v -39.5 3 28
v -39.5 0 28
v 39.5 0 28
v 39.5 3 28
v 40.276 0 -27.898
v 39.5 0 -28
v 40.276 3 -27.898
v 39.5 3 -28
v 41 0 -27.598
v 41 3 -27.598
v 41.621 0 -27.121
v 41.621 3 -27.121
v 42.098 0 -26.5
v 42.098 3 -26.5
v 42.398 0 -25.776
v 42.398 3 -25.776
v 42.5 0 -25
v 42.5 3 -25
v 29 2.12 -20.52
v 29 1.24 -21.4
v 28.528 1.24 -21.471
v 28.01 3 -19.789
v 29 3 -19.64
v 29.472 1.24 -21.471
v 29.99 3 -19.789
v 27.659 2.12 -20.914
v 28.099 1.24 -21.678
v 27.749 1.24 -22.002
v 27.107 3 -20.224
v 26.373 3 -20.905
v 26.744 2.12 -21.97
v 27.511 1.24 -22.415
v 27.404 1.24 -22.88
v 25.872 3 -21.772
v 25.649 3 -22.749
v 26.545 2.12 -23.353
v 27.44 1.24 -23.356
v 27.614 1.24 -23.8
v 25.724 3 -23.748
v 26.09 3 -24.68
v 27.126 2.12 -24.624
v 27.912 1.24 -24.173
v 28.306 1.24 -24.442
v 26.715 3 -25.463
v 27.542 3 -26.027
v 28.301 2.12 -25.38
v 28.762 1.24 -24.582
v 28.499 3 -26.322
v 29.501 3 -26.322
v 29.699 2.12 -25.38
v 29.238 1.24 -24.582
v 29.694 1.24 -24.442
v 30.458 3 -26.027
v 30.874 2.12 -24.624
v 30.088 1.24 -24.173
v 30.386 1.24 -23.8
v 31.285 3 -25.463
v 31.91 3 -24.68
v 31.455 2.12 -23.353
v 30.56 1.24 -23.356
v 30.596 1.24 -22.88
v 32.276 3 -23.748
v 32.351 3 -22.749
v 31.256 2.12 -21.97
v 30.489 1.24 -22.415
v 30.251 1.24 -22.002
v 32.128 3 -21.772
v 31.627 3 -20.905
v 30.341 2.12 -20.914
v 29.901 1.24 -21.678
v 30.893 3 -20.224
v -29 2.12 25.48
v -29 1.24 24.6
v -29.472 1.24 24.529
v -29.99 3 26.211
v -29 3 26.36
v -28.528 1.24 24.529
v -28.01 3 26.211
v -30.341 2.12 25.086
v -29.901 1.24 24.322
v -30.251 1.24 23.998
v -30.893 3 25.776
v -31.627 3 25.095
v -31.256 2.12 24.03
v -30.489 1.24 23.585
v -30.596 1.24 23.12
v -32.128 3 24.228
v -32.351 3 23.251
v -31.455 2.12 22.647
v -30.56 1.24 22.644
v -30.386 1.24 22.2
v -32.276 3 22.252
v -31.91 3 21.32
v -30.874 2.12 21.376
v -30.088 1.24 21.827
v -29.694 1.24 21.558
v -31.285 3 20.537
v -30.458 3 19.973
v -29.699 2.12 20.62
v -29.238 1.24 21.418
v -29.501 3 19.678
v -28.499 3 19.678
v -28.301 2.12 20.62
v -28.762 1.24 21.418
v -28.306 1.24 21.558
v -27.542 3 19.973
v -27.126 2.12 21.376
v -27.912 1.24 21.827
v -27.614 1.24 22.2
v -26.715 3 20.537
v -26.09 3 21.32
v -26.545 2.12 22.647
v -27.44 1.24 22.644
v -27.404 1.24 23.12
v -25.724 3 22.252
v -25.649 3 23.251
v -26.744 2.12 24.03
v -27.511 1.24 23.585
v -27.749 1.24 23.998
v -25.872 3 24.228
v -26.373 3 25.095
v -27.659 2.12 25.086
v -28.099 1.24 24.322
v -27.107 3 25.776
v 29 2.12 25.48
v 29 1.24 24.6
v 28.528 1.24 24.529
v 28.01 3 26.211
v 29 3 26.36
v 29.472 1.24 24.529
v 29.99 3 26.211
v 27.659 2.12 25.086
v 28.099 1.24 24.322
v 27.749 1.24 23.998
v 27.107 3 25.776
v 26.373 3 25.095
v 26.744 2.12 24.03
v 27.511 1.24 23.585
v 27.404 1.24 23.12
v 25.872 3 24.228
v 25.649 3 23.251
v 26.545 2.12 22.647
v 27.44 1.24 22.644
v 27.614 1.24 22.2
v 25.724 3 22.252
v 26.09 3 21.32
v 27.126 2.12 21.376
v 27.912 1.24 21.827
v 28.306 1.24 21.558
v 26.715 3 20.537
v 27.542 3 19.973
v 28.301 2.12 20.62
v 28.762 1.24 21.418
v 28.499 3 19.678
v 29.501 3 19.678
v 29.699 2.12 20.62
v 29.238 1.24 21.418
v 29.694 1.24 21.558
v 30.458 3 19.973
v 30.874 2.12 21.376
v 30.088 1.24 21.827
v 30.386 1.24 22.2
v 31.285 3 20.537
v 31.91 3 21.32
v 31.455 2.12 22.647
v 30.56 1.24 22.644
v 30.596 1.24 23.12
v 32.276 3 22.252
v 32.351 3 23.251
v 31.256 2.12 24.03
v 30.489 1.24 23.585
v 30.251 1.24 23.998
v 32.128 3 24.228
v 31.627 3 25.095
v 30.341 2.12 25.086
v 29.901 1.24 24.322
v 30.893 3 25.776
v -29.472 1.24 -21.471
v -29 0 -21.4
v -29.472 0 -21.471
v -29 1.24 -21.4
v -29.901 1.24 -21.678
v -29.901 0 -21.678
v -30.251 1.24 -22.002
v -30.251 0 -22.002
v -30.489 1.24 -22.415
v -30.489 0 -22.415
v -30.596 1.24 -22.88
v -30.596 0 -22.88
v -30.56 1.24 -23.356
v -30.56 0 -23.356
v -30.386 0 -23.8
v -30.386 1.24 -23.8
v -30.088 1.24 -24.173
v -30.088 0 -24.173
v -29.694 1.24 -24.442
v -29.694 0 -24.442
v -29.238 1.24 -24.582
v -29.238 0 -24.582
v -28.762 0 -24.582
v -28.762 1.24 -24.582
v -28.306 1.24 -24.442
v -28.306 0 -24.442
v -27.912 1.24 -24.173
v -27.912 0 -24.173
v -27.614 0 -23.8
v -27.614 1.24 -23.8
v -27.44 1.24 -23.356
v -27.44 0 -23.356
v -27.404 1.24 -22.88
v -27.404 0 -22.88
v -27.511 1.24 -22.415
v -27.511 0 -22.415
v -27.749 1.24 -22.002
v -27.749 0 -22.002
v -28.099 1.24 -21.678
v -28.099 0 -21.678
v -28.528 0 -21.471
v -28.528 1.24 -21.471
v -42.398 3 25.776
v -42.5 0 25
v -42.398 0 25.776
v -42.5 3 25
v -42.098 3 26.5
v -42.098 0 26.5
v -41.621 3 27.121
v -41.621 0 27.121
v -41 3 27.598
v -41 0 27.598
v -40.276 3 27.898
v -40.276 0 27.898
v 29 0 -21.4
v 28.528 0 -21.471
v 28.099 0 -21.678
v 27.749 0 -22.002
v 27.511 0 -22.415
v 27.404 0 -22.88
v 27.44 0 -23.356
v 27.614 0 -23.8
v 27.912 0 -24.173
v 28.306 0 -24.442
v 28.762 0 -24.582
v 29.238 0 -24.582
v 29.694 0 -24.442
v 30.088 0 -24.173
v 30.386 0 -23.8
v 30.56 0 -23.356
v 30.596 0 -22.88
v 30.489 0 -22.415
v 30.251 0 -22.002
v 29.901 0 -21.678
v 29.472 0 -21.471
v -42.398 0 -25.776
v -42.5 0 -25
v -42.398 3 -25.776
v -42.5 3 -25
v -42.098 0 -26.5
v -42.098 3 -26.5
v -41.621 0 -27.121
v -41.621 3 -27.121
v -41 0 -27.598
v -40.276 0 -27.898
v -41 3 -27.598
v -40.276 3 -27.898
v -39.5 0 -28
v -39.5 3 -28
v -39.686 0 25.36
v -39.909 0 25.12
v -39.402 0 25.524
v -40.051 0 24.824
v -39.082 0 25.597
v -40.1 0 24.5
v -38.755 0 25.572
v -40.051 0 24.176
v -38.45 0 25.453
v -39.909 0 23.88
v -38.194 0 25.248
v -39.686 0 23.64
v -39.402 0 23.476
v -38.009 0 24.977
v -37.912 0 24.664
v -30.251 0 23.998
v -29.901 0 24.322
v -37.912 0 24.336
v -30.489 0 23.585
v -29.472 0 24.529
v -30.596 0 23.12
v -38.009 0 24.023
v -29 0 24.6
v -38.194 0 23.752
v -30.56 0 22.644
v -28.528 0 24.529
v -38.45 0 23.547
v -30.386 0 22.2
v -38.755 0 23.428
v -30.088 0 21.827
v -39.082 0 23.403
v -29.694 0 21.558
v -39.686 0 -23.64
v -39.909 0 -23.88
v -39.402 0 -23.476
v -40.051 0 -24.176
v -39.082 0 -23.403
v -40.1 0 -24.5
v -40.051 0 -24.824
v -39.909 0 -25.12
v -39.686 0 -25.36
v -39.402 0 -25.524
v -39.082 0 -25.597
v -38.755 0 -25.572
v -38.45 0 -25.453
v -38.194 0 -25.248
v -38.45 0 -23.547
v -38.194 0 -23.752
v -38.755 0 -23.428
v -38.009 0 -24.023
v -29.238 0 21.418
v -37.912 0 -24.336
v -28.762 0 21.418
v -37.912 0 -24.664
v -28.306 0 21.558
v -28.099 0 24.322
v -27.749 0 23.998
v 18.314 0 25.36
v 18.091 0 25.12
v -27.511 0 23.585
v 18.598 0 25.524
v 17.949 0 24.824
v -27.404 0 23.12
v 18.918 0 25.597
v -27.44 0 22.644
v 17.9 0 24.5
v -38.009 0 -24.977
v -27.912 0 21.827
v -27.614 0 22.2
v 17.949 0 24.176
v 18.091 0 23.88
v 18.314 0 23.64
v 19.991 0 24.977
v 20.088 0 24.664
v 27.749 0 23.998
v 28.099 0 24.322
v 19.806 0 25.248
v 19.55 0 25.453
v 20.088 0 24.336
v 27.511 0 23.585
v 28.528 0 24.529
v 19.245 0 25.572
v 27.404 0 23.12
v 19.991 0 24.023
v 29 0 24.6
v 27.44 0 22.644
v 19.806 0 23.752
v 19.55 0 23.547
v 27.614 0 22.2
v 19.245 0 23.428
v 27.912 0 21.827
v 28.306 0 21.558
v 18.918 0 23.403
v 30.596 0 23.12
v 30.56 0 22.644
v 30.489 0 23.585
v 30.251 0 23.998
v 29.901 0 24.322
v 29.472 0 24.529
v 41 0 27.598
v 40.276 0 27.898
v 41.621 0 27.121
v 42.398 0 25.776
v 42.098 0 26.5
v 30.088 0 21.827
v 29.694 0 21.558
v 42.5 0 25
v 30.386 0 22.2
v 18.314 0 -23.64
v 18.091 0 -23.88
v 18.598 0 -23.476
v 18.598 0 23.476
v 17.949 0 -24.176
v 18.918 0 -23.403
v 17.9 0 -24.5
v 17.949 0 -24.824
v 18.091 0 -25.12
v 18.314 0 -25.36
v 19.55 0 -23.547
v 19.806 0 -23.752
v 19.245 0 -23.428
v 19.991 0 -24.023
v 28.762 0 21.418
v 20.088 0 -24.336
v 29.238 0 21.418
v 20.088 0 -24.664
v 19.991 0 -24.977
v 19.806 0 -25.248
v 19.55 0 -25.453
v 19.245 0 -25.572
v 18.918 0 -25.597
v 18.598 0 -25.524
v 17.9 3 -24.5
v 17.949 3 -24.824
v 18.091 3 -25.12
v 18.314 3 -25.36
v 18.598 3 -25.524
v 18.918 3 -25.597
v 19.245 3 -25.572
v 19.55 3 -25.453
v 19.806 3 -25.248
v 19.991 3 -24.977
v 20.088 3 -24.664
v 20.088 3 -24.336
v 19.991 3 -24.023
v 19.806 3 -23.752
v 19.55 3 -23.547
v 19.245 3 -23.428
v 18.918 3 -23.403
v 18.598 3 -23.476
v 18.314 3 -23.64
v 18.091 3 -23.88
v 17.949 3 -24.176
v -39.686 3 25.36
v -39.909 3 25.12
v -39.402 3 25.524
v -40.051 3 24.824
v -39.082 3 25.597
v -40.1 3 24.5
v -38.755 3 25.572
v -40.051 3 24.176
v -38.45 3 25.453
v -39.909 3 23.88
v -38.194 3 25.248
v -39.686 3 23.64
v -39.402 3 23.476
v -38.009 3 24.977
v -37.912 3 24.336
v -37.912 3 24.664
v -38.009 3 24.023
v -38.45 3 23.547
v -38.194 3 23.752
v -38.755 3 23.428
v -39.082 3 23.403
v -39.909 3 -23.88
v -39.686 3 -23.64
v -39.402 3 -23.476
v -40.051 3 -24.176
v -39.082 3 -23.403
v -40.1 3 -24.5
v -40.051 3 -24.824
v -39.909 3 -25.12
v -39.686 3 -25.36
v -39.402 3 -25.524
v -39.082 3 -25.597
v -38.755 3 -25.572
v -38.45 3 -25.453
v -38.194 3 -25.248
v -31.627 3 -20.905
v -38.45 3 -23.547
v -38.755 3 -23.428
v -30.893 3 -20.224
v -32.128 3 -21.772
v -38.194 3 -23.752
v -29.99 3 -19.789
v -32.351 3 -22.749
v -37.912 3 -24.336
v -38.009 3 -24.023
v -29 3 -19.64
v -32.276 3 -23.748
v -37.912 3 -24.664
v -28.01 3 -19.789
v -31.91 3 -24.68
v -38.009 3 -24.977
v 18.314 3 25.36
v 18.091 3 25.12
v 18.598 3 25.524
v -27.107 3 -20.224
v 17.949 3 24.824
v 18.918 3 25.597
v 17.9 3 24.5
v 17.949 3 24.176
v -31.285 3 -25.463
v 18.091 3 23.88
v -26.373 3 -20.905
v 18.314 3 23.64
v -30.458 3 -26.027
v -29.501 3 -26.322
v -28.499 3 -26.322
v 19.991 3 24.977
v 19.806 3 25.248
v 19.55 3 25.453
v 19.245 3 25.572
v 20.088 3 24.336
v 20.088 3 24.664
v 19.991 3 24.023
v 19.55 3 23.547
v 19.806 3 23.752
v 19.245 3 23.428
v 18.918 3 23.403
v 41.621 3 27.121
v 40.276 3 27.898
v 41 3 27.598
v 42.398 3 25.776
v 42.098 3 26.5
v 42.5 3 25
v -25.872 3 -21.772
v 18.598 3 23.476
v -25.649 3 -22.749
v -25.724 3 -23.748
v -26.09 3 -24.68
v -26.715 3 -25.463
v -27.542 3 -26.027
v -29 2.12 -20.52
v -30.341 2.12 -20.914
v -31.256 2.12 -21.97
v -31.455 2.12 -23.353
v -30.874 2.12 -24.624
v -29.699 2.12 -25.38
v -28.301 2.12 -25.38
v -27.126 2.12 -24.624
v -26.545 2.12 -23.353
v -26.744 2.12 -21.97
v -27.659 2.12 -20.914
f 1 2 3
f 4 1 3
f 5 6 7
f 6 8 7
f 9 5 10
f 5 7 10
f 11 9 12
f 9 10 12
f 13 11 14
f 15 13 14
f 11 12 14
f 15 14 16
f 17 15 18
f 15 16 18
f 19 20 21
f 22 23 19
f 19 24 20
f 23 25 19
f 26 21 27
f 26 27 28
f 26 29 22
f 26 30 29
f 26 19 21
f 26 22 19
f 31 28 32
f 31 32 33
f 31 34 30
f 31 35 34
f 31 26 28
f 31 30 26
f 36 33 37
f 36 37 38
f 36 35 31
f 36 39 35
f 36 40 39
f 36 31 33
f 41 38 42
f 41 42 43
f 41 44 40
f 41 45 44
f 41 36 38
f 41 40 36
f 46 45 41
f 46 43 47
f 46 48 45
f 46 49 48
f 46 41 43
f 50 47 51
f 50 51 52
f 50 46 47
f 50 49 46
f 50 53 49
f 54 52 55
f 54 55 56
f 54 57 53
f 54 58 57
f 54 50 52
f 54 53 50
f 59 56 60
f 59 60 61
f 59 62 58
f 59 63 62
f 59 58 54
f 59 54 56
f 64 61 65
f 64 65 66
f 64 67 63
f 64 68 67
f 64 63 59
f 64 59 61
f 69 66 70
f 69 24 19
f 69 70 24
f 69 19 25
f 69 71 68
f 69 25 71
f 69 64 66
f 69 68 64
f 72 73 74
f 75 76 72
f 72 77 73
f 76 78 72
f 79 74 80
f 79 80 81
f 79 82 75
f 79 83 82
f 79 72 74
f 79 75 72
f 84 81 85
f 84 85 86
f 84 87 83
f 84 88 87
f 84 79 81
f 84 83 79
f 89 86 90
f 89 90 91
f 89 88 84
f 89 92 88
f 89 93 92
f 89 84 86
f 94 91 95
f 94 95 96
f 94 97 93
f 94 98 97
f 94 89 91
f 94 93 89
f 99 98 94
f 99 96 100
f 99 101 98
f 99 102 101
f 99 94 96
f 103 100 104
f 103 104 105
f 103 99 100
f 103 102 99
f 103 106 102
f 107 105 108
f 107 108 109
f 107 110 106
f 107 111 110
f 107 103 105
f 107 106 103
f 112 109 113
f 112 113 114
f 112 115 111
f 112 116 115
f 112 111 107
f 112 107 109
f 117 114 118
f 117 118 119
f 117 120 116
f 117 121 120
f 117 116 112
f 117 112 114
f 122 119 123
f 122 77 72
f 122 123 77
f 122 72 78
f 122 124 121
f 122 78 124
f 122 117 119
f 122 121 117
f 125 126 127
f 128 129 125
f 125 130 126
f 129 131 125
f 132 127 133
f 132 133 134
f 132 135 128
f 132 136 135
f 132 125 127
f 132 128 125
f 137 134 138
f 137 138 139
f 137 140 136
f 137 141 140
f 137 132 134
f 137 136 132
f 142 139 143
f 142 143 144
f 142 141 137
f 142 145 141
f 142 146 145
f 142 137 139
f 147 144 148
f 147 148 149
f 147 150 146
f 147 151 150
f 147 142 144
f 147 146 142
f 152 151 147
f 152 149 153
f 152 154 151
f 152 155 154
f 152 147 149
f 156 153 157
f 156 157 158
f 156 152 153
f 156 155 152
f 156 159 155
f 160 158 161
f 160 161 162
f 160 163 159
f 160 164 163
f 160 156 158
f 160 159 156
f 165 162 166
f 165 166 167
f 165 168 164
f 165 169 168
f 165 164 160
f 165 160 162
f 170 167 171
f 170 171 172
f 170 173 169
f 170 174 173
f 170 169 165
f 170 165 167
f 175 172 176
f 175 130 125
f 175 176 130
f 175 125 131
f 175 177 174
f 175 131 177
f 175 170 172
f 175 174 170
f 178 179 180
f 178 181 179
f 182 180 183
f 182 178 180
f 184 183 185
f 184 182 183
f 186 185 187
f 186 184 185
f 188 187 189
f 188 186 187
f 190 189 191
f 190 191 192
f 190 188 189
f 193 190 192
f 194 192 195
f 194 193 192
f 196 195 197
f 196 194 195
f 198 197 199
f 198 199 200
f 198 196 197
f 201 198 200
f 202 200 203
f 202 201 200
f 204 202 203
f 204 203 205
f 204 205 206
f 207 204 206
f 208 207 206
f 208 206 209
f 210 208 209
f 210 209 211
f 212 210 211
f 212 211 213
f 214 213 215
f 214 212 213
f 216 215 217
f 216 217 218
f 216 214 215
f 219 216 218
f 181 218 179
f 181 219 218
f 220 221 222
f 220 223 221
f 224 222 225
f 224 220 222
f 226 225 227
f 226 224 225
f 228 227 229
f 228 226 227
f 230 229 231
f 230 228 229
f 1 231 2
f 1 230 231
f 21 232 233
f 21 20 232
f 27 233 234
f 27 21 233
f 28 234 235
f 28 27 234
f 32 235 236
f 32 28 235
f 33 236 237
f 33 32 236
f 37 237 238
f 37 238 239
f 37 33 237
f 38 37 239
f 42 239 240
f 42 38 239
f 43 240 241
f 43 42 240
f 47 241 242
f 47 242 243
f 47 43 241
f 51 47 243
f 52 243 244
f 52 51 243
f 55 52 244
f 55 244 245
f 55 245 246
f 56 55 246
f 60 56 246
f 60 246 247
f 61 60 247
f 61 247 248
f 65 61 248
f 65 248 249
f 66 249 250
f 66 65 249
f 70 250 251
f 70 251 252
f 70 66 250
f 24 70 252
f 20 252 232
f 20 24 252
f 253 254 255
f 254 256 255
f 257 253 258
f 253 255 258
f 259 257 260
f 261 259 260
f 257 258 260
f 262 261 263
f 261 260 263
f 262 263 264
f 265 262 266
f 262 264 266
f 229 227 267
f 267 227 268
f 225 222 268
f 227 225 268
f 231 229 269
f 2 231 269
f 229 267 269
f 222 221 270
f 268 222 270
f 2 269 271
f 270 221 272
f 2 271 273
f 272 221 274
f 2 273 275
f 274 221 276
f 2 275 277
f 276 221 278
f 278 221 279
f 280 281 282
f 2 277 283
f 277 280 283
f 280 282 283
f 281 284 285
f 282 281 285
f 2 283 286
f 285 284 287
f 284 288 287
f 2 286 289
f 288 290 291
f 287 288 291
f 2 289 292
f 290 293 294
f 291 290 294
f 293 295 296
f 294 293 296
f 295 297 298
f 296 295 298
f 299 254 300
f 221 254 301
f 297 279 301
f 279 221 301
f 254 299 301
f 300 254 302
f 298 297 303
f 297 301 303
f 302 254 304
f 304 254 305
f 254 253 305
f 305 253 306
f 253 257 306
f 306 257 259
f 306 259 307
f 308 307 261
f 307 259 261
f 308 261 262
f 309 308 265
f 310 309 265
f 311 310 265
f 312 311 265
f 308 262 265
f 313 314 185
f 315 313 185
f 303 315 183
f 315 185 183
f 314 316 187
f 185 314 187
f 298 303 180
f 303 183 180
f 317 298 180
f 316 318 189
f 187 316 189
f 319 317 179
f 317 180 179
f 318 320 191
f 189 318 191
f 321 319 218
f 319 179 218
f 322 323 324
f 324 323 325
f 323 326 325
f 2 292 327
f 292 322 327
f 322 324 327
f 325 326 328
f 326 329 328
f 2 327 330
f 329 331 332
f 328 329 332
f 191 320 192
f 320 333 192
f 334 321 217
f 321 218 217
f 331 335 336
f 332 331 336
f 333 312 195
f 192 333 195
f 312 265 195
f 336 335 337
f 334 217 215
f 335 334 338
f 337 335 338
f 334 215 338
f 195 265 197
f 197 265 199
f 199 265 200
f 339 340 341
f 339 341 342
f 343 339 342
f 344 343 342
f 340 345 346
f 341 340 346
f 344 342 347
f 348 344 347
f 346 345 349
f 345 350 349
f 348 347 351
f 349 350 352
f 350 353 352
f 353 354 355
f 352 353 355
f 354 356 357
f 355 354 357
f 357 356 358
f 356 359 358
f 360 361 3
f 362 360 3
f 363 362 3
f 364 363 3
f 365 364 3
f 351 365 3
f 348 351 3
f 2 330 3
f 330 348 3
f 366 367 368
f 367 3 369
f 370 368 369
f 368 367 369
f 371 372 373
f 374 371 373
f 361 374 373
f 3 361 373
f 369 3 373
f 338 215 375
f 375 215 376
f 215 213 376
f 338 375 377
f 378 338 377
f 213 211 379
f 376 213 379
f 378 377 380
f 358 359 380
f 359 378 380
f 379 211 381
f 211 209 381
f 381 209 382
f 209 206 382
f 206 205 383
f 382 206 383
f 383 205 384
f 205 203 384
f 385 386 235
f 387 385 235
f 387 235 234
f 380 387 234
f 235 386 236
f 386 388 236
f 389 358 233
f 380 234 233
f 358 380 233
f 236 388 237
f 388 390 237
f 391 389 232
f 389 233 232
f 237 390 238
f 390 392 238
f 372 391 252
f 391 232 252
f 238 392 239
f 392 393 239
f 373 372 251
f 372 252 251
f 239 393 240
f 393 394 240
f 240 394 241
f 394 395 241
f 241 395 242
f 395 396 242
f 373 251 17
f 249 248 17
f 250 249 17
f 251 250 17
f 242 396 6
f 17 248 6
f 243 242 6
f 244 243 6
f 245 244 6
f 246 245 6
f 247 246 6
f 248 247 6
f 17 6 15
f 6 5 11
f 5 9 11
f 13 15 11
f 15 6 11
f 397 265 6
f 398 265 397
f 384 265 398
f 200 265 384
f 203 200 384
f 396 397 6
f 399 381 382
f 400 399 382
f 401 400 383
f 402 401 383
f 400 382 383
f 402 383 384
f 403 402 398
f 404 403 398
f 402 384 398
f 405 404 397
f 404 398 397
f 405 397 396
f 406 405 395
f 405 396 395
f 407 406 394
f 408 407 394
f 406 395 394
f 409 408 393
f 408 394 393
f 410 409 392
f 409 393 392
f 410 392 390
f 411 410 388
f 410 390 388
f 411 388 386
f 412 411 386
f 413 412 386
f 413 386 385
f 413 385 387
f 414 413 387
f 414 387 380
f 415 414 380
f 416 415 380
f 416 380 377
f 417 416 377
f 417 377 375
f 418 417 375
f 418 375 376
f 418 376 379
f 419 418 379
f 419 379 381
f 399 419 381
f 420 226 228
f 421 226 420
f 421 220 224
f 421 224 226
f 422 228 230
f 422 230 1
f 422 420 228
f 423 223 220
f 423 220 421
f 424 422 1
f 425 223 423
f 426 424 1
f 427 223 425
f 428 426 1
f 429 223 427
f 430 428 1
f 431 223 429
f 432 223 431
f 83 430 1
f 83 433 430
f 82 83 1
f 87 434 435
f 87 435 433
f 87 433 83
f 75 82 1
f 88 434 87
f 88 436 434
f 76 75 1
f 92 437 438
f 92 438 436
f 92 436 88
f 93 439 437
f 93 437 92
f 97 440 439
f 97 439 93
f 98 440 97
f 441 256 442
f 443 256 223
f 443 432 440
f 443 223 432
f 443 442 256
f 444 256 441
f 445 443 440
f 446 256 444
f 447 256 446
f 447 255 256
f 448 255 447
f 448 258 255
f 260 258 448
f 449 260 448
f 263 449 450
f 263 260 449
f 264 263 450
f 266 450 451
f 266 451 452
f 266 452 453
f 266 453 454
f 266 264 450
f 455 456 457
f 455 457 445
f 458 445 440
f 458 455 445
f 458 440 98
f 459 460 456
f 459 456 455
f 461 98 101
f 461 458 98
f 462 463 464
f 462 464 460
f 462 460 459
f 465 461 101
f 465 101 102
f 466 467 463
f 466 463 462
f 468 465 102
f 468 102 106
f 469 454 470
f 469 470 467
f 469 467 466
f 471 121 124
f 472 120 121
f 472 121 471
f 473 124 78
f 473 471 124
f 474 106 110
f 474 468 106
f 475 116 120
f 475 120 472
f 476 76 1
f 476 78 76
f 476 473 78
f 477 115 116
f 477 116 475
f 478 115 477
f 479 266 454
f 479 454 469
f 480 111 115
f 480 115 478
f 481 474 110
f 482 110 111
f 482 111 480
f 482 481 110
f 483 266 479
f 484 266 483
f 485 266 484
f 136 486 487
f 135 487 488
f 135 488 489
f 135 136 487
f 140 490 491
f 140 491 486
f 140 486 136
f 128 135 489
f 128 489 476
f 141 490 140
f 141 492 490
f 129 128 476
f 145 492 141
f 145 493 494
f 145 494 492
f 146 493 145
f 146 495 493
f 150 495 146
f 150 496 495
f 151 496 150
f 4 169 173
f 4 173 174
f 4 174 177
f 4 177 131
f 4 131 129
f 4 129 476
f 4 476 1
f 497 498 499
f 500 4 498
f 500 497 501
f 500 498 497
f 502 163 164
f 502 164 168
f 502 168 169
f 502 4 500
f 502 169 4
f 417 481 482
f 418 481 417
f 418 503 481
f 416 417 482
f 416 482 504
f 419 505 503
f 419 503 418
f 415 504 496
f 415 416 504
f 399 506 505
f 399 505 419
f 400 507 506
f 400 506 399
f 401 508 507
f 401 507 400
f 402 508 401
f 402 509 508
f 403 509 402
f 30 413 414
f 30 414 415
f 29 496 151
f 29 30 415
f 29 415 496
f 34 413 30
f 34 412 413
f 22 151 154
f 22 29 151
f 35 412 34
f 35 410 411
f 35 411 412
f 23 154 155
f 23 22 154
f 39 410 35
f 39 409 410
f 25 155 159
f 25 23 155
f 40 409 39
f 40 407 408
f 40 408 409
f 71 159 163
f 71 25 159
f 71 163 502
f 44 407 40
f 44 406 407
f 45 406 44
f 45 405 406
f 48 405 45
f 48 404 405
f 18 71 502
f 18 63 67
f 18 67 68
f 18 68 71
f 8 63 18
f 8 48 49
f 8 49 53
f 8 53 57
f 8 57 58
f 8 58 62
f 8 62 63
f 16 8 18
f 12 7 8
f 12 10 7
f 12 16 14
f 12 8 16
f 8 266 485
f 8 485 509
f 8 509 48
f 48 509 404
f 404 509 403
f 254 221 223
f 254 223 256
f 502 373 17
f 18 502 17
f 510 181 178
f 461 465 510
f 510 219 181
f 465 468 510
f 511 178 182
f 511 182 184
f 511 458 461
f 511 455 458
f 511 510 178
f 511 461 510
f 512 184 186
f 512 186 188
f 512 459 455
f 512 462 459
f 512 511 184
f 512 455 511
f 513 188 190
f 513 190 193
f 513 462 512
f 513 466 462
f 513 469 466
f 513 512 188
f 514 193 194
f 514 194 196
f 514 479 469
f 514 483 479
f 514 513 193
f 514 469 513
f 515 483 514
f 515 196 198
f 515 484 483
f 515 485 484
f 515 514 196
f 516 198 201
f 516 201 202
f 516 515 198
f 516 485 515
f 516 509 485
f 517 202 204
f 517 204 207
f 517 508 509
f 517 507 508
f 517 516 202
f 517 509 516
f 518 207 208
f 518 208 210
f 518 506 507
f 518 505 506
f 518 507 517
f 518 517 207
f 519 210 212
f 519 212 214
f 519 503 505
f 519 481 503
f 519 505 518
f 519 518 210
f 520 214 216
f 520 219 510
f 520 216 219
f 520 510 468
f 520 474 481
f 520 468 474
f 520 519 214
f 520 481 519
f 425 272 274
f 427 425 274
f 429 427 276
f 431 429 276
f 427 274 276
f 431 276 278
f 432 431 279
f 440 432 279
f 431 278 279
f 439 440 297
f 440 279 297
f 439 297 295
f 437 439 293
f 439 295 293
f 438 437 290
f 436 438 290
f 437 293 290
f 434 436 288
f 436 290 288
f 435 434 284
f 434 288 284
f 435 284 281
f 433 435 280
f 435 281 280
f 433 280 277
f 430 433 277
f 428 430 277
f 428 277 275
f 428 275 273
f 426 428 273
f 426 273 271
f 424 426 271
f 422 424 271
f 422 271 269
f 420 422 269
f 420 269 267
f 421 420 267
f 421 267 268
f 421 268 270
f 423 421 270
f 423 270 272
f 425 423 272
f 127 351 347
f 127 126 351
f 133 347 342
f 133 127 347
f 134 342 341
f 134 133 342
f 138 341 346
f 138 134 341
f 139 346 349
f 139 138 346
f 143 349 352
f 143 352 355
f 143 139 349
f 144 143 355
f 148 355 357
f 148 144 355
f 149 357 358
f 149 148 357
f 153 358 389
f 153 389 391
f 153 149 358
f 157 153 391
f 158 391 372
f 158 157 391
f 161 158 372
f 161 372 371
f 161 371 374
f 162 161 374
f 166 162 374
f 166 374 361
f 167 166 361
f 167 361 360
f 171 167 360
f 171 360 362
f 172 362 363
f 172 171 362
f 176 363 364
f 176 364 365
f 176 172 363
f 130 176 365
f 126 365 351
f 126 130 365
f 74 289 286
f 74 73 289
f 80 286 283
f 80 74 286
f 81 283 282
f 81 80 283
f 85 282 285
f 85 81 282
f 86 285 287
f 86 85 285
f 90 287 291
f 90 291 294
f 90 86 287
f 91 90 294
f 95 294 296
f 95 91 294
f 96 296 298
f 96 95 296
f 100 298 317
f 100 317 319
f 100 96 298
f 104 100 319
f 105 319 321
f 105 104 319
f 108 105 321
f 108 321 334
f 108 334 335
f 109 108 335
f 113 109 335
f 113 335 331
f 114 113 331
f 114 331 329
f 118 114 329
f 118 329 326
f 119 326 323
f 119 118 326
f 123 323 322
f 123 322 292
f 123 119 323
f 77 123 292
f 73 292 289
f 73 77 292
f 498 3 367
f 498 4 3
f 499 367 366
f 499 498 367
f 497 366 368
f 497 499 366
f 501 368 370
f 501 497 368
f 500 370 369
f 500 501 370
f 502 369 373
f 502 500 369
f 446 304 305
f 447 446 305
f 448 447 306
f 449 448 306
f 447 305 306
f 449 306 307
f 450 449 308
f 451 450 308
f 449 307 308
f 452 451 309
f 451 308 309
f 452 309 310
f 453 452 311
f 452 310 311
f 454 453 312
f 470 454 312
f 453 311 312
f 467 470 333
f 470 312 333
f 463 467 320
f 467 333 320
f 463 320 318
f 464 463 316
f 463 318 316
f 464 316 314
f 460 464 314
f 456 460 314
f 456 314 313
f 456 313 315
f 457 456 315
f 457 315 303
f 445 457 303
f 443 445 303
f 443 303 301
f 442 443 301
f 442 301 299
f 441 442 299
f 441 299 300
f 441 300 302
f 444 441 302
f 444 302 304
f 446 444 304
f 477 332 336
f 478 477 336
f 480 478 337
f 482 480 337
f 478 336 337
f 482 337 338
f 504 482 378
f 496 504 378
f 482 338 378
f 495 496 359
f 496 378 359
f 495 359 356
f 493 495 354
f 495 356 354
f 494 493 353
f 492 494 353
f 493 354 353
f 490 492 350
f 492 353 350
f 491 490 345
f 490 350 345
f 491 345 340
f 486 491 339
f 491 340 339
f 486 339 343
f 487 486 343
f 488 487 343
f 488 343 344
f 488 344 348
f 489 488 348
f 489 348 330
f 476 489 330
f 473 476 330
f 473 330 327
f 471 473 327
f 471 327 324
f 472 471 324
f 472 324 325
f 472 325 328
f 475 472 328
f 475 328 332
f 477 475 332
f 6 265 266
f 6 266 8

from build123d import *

# Parameters (mm, degrees)
SKETCH1_W                    = 85
SKETCH1_H                    = 56
BOSS_EXTRUDE1_DEPTH          = 3
M2_CLEARANCE_HOLE1_D         = 2.2
M2_CLEARANCE_HOLE1_DEPTH     = 5
M2_CLEARANCE_HOLE1_TIP       = 0.660946681
FILLET1_R                    = 3
CSK_FOR_M3_SFHCS1_AT_2_COUNT = 2
CSK_FOR_M3_SFHCS1_AT_2_PITCH = 74.027022093
CSK_FOR_M3_SFHCS1_AT_3_COUNT = 2
CSK_FOR_M3_SFHCS1_AT_3_PITCH = 46
CSK_FOR_M3_SFHCS1_AT_4_COUNT = 2
CSK_FOR_M3_SFHCS1_AT_4_PITCH = 58


with BuildPart() as part:
    # Sketch1 → Boss-Extrude1 (new body)
    with BuildSketch(Plane(origin=(0, 0, 0), x_dir=(1, 0, 0), z_dir=(0, 1, 0))):
        Rectangle(SKETCH1_W, SKETCH1_H)
    extrude(amount=BOSS_EXTRUDE1_DEPTH)

    # M2 Clearance Hole1
    with Locations(Plane(origin=(0, 3, 0), x_dir=(1, 0, 0), z_dir=(0, 1, 0))):
        with Locations((-39, 24.5), (19, -24.5), (19, 24.5), (-39, -24.5)):
            Hole(M2_CLEARANCE_HOLE1_D / 2, depth=M2_CLEARANCE_HOLE1_DEPTH)
            with Locations((0, 0, -(M2_CLEARANCE_HOLE1_DEPTH + M2_CLEARANCE_HOLE1_TIP / 2))):  # 118° drill point
                Cone(0, M2_CLEARANCE_HOLE1_D / 2, M2_CLEARANCE_HOLE1_TIP, mode=Mode.SUBTRACT)

    # Fillet1
    fillet1_edges = [part.edges().sort_by_distance(p)[0] for p in [
        (-42.5, 1.5, -28),
        (42.5, 1.5, -28),
        (42.5, 1.5, 28),
        (-42.5, 1.5, 28),
    ]]
    fillet(fillet1_edges, radius=FILLET1_R)

    # Sketch6 → CSK for M3 SFHCS1 (revolve, cut)
    with BuildSketch(Plane(origin=(-29, 3, -23), x_dir=(0, 0, 1), z_dir=(1, 0, 0))):
        Polygon((0, 0), (0, 3), (1.6, 3), (1.6, 1.76), (3.36, 0), align=None)
    csk_for_m3_sfhcs1 = revolve(axis=Axis((-29, 9.35, -23), (0, -1, 0)), mode=Mode.SUBTRACT)

    # CSK for M3 SFHCS1 at 2: CSK for M3 SFHCS1 ×2
    with Locations(*[Vector(0.7834976790895338, 0, 0.621394711002044) * (i * CSK_FOR_M3_SFHCS1_AT_2_PITCH) for i in range(1, CSK_FOR_M3_SFHCS1_AT_2_COUNT)]):
        add(csk_for_m3_sfhcs1, mode=Mode.SUBTRACT)

    # CSK for M3 SFHCS1 at 3: CSK for M3 SFHCS1 ×2
    with Locations(*[(0, 0, i * CSK_FOR_M3_SFHCS1_AT_3_PITCH) for i in range(1, CSK_FOR_M3_SFHCS1_AT_3_COUNT)]):
        add(csk_for_m3_sfhcs1, mode=Mode.SUBTRACT)

    # CSK for M3 SFHCS1 at 4: CSK for M3 SFHCS1 ×2
    with Locations(*[(i * CSK_FOR_M3_SFHCS1_AT_4_PITCH, 0, 0) for i in range(1, CSK_FOR_M3_SFHCS1_AT_4_COUNT)]):
        add(csk_for_m3_sfhcs1, mode=Mode.SUBTRACT)


solid = part.part
